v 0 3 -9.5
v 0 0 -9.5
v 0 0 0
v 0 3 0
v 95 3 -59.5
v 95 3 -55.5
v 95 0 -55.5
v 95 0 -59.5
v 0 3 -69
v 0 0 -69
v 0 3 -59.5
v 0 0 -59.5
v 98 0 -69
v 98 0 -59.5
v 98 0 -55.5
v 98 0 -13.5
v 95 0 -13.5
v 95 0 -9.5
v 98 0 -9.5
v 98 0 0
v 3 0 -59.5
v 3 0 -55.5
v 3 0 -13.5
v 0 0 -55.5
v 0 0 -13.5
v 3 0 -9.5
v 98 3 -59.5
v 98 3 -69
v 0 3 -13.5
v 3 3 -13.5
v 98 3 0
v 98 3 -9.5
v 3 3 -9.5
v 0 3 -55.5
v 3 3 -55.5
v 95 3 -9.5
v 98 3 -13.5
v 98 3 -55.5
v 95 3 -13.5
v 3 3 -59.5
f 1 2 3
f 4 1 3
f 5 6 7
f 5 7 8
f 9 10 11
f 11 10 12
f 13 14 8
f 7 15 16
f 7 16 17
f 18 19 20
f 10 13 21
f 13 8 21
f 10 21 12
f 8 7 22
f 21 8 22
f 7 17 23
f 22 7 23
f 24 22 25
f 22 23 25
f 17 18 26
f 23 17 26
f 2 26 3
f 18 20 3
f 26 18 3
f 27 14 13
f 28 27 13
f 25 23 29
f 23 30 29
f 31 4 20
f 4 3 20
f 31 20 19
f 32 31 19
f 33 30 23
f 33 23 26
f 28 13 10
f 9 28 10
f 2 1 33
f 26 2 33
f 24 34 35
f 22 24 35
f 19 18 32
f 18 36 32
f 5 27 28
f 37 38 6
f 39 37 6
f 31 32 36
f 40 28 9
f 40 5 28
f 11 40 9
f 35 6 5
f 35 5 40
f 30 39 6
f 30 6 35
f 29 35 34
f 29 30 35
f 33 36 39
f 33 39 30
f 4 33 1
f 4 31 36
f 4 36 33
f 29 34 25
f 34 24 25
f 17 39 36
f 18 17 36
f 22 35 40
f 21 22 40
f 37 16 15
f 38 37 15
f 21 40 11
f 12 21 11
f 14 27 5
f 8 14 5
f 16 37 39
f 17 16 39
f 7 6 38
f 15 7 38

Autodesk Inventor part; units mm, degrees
ref_plane "YZ Plane" through (0, 0, 0) normal (1, 0, 0) x (0, 1, 0)
ref_plane "XZ Plane" through (0, 0, 0) normal (0, 1, 0) x (-1, 0, 0)
ref_plane "XY Plane" through (0, 0, 0) normal (0, 0, 1) x (1, 0, 0)
sketch "Sketch1" plane through (0, 0, 0) normal (0, 1, 0) x (-1, 0, 0)
  line L0 (0, 0) -> (-98, 0)
  line L1 (-98, 0) -> (-98, -69)
  line L2 (-98, -69) -> (0, -69)
  line L3 (0, -69) -> (0, 0)
  dimension "d0" = 98
  dimension "d1" = 69
extrude "Extrusion1" add sketch "Sketch1" along normal blind 3
sketch "Sketch2" plane through (0, 3, 0) normal (0, 1, 0) x (1, 0, 0)
  line L0 (0, 69) -> (0, 0) projected
  line L1 (0, 37) -> (9.5, 37)
  line L2 (9.5, 37) -> (9.5, 21)
  line L3 (9.5, 21) -> (0, 21)
  line L4 (0, 21) -> (0, 37)
  line L5 (98, 69) -> (0, 69) projected
  line L6 (57, 59.7224) -> (57, 18.4065)
  line L7 (114, 37) -> (104.5, 37)
  line L8 (104.5, 37) -> (104.5, 21)
  line L9 (104.5, 21) -> (114, 21)
  line L10 (114, 21) -> (114, 37)
  point P0 (9.5, 29)
  point P1 (104.5, 29)
  dimension "d4" = 9.5
  dimension "d5" = 16
  dimension "d6" = 8
  dimension "d7" = 40
  dimension "d8" = 57
sketch "Sketch3" plane through (0, 3, 0) normal (0, 1, 0) x (1, 0, 0)
  point P0 (0, 0)
sketch "Sketch4" plane through (0, 3, 0) normal (0, 1, 0) x (1, 0, 0)
  line L0 (9.5, 9.5) -> (104.5, 9.5)
  line L1 (104.5, 9.5) -> (104.5, 48.5)
  line L2 (104.5, 48.5) -> (9.5, 48.5)
  line L3 (9.5, 48.5) -> (9.5, 9.5)
  line L4 (98, 69) -> (0, 69) projected
  line L5 (14.5, 14) -> (99.5, 14)
  line L6 (99.5, 14) -> (99.5, 44)
  line L7 (99.5, 44) -> (14.5, 44)
  line L8 (14.5, 44) -> (14.5, 14)
  line L9 (98, 0) -> (98, 69) projected
  line L10 (104.5, 31) -> (104.5, 47) projected
  point P0 (0, 0)
  point P1 (1.7335, 29)
  point P2 (81.752, 29)
  point P3 (14.5, 29)
  point P4 (57, 14)
  point P5 (41, 5.8312)
  point P6 (114, 31)
  point P7 (57, 48.3096)
  point P8 (57, 9.5)
  dimension "d11" = 95
  dimension "d12" = 39
  dimension "d13" = 40
  dimension "d14" = 19.5
  dimension "d15" = 40
  dimension "d16" = 85
  dimension "d17" = 30
  dimension "d18" = 15
  dimension "d19" = 40
  dimension "d43" = 57
  dimension "d44" = 47.5
  dimension "d45" = 47.5
  dimension "d46" = 47.5
sketch "Sketch5" plane through (0, 3, 0) normal (0, 1, 0) x (1, 0, 0)
  line L0 (59.5, 9.5) -> (54.5, 9.5)
  line L1 (54.5, 9.5) -> (54.5, 6.5)
  line L2 (54.5, 6.5) -> (59.5, 6.5)
  line L3 (59.5, 6.5) -> (59.5, 9.5)
  line L4 (59.5, 9.5) -> (54.5, 6.5) construction
  line L5 (54.5, 9.5) -> (59.5, 6.5) construction
  line L6 (9.5, 9.5) -> (104.5, 9.5) projected
  line L7 (59.5, 48.5) -> (54.5, 48.5)
  line L8 (54.5, 48.5) -> (54.5, 51.5)
  line L9 (54.5, 51.5) -> (59.5, 51.5)
  line L10 (59.5, 51.5) -> (59.5, 48.5)
  line L11 (59.5, 48.5) -> (54.5, 51.5) construction
  line L12 (54.5, 48.5) -> (59.5, 51.5) construction
  line L13 (104.5, 48.5) -> (9.5, 48.5) projected
  point P0 (0, 0)
  point P1 (57, 8)
  point P2 (57, 50)
  dimension "d23" = 5
  dimension "d24" = 3
  dimension "d25" = 5
  dimension "d26" = 3
sketch "Sketch6" plane through (0, 3, 0) normal (0, 1, 0) x (1, 0, 0)
  line L0 (59.5895, 38.8648) -> (53.5895, 38.8648)
  line L1 (53.5895, 38.8648) -> (53.5895, 48.8648)
  line L2 (53.5895, 48.8648) -> (59.5895, 48.8648)
  line L3 (59.5895, 48.8648) -> (59.5895, 38.8648)
  line L4 (59.5895, 38.8648) -> (56.5895, 38.8648)
  line L5 (56.5895, 38.8648) -> (56.5895, 41.3648)
  line L6 (56.5895, 41.3648) -> (59.5895, 41.3648)
  line L7 (59.5895, 41.3648) -> (59.5895, 38.8648)
  line L8 (59.5895, 48.8648) -> (56.5895, 48.8648)
  line L9 (56.5895, 48.8648) -> (56.5895, 46.3648)
  line L10 (56.5895, 46.3648) -> (59.5895, 46.3648)
  line L11 (59.5895, 46.3648) -> (59.5895, 48.8648)
  line L12 (59.5895, 25.9829) -> (53.5895, 25.9829)
  line L13 (53.5895, 25.9829) -> (53.5895, 35.9829)
  line L14 (53.5895, 35.9829) -> (59.5895, 35.9829)
  line L15 (59.5895, 35.9829) -> (59.5895, 25.9829)
  line L16 (59.5895, 25.9829) -> (56.5895, 25.9829)
  line L17 (56.5895, 25.9829) -> (56.5895, 28.4829)
  line L18 (56.5895, 28.4829) -> (59.5895, 28.4829)
  line L19 (59.5895, 28.4829) -> (59.5895, 25.9829)
  line L20 (59.5895, 35.9829) -> (56.5895, 35.9829)
  line L21 (56.5895, 35.9829) -> (56.5895, 33.4829)
  line L22 (56.5895, 33.4829) -> (59.5895, 33.4829)
  line L23 (59.5895, 33.4829) -> (59.5895, 35.9829)
  point P0 (0, 0)
  dimension "d29" = 6
  dimension "d30" = 10
  dimension "d31" = 3
  dimension "d32" = 2.5
  dimension "d33" = 3
  dimension "d34" = 2.5
  dimension "d35" = 6
  dimension "d36" = 10
  dimension "d37" = 3
  dimension "d38" = 2.5
  dimension "d39" = 3
  dimension "d40" = 2.5
sketch "Sketch7" plane through (0, 3, 0) normal (0, 1, 0) x (1, 0, 0)
  line L0 (0, 69) -> (0, 0) projected
  line L1 (98, 69) -> (0, 69) projected
  line L2 (98, 54.5) -> (0, 54.5)
  line L3 (0, 54.5) -> (0, 14.5)
  line L4 (0, 14.5) -> (98, 14.5)
  line L5 (98, 14.5) -> (98, 54.5)
  line L6 (98, 54.5) -> (0, 14.5) construction
  line L7 (0, 54.5) -> (98, 14.5) construction
  line L8 (98, 0) -> (98, 69) projected
  line L9 (0, 14.5) -> (3, 14.5)
  line L10 (3, 14.5) -> (3, 8.5)
  line L11 (3, 8.5) -> (0, 8.5)
  line L12 (0, 8.5) -> (0, 14.5)
  line L13 (49, 34.5) -> (49, 46.5013)
  line L14 (49, 34.5) -> (61.4324, 34.5)
  line L15 (0, 54.5) -> (3, 54.5)
  line L16 (3, 54.5) -> (3, 60.5)
  line L17 (3, 60.5) -> (0, 60.5)
  line L18 (0, 60.5) -> (0, 54.5)
  line L19 (98, 54.5) -> (95, 54.5)
  line L20 (95, 54.5) -> (95, 60.5)
  line L21 (95, 60.5) -> (98, 60.5)
  line L22 (98, 60.5) -> (98, 54.5)
  line L23 (98, 14.5) -> (95, 14.5)
  line L24 (95, 14.5) -> (95, 8.5)
  line L25 (95, 8.5) -> (98, 8.5)
  line L26 (98, 8.5) -> (98, 14.5)
  line L27 (0, 55.5) -> (3, 55.5)
  line L28 (3, 55.5) -> (3, 59.5)
  line L29 (3, 59.5) -> (0, 59.5)
  line L30 (0, 59.5) -> (0, 55.5)
  line L31 (0, 55.5) -> (3, 59.5) construction
  line L32 (3, 55.5) -> (0, 59.5) construction
  line L33 (0, 9.5) -> (3, 9.5)
  line L34 (3, 9.5) -> (3, 13.5)
  line L35 (3, 13.5) -> (0, 13.5)
  line L36 (0, 13.5) -> (0, 9.5)
  line L37 (0, 9.5) -> (3, 13.5) construction
  line L38 (3, 9.5) -> (0, 13.5) construction
  line L39 (95, 55.5) -> (98, 55.5)
  line L40 (98, 55.5) -> (98, 59.5)
  line L41 (98, 59.5) -> (95, 59.5)
  line L42 (95, 59.5) -> (95, 55.5)
  line L43 (95, 55.5) -> (98, 59.5) construction
  line L44 (98, 55.5) -> (95, 59.5) construction
  line L45 (95, 9.5) -> (98, 9.5)
  line L46 (98, 9.5) -> (98, 13.5)
  line L47 (98, 13.5) -> (95, 13.5)
  line L48 (95, 13.5) -> (95, 9.5)
  line L49 (95, 9.5) -> (98, 13.5) construction
  line L50 (98, 9.5) -> (95, 13.5) construction
  point P0 (0, 34.5)
  point P1 (49, 69)
  point P2 (1.5, 57.5)
  point P3 (1.5, 11.5)
  point P4 (96.5, 57.5)
  point P5 (96.5, 11.5)
  dimension "d47" = 40
  dimension "d48" = 3
  dimension "d49" = 6
  dimension "d50" = 6
  dimension "d51" = 3
  dimension "d52" = 6
  dimension "d53" = 3
  dimension "d54" = 6
  dimension "d55" = 3
  dimension "d56" = 3
  dimension "d57" = 4
  dimension "d58" = 3
  dimension "d59" = 4
  dimension "d60" = 3
  dimension "d61" = 4
  dimension "d62" = 3
  dimension "d63" = 4
extrude "Extrusion6" cut sketch "Sketch7" against normal through all contours L29 L16 L27 L0 | L8 L39 L20 L41 | L35 L10 L33 L0 | L8 L45 L24 L47
equation "\"d6\" = 0.5 * d5"
equation "\"d14\" = 0.5 * d12"
equation "\"d15\" = d13"
equation "\"d18\" = 0.5 * d17"
equation "\"d19\" = d13"
equation "\"d46\" = d45"
properties part number "roof_v2"
